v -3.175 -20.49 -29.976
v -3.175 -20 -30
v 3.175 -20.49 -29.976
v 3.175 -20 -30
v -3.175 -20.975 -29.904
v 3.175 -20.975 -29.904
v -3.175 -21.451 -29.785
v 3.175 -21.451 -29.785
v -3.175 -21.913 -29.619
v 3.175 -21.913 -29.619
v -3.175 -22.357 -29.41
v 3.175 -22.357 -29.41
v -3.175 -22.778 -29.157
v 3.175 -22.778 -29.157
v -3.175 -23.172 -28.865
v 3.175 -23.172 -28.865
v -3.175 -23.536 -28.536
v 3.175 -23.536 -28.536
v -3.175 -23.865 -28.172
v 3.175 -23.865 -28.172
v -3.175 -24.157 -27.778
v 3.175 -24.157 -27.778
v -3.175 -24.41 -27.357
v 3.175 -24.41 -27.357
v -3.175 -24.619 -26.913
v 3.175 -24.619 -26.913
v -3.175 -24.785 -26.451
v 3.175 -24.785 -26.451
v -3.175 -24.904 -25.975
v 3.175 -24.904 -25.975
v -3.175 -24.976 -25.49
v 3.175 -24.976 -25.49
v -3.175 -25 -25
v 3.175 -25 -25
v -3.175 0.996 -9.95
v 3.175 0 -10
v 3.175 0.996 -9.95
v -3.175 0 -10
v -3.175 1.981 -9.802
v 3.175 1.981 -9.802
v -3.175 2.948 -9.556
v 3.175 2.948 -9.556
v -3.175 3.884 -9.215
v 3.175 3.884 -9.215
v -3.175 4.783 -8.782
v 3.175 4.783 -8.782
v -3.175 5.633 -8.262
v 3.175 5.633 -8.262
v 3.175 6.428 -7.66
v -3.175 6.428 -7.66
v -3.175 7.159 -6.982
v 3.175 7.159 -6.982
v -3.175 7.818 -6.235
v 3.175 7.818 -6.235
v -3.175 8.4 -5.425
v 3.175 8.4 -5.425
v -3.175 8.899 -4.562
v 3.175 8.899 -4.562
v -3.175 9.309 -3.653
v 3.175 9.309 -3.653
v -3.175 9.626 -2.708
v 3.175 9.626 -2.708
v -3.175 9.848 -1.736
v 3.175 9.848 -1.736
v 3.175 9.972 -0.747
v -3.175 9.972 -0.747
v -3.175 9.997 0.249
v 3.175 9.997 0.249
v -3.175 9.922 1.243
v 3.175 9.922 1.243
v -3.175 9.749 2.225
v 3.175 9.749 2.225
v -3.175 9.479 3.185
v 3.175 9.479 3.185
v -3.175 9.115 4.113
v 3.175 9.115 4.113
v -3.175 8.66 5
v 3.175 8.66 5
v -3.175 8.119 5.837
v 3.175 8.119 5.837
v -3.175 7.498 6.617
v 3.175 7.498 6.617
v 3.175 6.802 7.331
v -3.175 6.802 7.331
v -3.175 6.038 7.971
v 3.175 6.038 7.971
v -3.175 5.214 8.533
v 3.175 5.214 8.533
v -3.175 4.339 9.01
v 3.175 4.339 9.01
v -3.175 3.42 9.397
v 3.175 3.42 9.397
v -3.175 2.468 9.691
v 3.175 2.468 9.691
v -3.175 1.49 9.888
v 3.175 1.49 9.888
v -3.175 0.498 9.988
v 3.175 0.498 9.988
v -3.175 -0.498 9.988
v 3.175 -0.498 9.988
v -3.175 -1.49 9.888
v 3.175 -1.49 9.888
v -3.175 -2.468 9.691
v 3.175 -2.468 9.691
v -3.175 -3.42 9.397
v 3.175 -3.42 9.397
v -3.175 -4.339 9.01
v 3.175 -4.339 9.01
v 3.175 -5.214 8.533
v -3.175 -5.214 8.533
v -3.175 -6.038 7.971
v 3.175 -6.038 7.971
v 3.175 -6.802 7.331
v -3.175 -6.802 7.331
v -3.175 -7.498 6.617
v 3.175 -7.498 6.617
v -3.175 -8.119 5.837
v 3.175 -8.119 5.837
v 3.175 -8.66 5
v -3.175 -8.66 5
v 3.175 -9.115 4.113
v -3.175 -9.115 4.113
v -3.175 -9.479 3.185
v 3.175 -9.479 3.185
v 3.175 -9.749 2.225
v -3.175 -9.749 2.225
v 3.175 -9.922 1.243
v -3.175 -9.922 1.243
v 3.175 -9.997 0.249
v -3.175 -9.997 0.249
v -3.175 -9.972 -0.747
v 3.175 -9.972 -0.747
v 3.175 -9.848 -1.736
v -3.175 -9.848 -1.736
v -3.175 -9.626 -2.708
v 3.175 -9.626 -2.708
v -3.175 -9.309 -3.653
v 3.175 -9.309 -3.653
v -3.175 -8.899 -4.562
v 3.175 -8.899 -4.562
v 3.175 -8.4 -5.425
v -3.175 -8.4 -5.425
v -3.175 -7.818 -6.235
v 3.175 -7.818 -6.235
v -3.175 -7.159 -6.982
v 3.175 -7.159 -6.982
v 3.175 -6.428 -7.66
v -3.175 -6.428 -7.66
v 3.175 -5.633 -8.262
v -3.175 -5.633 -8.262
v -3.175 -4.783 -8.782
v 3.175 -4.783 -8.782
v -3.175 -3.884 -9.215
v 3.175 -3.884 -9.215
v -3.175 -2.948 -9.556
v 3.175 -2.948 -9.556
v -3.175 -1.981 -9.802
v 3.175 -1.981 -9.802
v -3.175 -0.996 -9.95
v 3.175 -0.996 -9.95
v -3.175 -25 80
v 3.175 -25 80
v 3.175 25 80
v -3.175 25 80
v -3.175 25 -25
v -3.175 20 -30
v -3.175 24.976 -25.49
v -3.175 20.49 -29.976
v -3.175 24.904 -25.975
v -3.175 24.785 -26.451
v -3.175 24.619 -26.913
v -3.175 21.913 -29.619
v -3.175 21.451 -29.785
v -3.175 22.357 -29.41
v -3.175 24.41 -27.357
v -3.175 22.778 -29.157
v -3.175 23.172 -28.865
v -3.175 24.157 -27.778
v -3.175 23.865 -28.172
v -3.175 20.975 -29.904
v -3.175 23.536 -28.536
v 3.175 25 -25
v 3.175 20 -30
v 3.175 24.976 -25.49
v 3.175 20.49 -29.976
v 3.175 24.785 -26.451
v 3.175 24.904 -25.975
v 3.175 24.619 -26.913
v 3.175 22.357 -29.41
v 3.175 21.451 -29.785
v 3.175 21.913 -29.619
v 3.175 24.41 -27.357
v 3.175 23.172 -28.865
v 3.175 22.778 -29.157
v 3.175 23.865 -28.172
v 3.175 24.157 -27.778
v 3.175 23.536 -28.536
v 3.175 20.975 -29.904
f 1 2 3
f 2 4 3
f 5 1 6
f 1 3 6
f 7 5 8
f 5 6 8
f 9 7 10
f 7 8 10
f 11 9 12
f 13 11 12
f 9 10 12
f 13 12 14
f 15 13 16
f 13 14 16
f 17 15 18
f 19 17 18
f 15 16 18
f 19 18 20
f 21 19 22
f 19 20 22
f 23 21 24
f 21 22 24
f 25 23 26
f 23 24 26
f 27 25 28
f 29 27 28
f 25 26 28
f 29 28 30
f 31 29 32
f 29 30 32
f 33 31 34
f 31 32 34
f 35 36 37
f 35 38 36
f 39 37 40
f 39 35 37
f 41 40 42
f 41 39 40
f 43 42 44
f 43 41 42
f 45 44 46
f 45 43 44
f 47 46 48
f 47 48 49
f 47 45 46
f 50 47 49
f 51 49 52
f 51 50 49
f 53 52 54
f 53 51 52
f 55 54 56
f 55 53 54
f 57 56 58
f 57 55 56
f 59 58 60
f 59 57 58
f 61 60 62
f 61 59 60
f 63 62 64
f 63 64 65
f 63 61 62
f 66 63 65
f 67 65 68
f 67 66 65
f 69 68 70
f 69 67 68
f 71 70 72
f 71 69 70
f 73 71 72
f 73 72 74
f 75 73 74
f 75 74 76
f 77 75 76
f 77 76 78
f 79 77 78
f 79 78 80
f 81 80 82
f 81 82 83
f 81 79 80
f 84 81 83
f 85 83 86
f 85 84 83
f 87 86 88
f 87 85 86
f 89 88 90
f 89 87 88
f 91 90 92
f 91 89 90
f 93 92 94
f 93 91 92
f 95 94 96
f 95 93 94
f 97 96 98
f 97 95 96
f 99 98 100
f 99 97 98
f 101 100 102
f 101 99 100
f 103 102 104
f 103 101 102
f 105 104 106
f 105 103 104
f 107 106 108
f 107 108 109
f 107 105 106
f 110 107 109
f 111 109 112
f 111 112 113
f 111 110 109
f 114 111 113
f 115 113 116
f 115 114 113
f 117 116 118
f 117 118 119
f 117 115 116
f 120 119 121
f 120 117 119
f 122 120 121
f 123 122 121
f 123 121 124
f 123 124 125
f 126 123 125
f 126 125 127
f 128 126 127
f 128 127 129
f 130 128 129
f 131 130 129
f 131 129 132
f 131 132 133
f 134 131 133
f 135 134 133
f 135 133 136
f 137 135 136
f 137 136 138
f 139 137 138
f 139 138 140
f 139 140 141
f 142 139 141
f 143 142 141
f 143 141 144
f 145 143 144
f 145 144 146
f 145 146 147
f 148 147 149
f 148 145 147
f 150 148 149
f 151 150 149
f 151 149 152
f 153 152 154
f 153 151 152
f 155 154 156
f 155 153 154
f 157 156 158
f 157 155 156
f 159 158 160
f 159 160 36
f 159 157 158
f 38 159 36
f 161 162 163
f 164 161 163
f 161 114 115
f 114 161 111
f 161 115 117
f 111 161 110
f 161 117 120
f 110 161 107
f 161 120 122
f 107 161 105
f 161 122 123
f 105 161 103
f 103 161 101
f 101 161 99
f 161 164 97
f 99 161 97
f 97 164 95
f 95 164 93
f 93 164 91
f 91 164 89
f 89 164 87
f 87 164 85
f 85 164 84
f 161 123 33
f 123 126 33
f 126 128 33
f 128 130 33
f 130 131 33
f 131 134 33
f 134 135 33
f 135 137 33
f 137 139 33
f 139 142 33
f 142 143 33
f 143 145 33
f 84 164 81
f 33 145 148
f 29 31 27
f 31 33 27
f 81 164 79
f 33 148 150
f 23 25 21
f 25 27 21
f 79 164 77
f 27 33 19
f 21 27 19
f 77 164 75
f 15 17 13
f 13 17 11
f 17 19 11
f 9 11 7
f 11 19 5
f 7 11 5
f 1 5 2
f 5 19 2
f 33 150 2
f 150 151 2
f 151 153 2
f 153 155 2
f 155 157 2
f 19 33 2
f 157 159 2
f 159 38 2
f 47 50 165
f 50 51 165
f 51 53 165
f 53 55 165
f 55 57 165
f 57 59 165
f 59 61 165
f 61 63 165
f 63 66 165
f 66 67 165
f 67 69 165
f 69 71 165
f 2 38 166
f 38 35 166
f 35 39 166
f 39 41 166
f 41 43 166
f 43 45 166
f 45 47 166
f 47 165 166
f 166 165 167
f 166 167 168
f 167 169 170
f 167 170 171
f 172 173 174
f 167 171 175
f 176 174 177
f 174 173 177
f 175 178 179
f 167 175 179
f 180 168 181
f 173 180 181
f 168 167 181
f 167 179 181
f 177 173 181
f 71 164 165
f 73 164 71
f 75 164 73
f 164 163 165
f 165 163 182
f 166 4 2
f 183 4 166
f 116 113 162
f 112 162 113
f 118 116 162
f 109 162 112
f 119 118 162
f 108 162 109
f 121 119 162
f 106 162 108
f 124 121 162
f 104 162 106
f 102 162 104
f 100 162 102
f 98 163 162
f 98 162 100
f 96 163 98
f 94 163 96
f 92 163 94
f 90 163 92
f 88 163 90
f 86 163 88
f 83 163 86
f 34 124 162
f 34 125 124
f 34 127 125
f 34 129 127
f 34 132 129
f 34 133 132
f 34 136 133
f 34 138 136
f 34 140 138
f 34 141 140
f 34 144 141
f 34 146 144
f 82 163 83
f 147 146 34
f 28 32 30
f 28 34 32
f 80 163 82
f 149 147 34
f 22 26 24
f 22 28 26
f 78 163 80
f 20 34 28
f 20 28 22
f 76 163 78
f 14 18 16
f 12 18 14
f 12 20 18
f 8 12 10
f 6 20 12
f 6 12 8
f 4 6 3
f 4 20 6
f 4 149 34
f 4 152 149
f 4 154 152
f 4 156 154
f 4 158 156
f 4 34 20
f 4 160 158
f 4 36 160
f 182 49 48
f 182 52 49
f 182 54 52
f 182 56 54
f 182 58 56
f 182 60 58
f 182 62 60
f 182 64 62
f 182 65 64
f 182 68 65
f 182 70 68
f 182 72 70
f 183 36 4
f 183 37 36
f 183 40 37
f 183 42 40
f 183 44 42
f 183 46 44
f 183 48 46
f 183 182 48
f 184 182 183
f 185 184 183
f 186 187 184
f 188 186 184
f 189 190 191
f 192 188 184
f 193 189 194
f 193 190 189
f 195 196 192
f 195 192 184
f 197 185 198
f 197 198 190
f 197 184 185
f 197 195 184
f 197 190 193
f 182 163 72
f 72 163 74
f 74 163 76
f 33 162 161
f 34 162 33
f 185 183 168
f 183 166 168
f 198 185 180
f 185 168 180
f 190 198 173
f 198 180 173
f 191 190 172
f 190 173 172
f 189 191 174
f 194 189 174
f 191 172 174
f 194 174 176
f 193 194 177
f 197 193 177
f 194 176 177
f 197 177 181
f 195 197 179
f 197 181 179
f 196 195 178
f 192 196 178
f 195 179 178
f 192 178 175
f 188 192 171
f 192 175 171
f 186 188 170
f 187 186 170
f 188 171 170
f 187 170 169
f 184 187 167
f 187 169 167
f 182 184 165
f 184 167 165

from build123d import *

# Parameters (mm, degrees)
SKETCH1_W           = 110
SKETCH1_H           = 50
SKETCH1_R           = 10
BOSS_EXTRUDE1_DEPTH = 3.175
FILLET1_R           = 5


with BuildPart() as part:
    # Sketch1 → Boss-Extrude1 (new, symmetric)
    with BuildSketch(Plane(origin=(0, 0, 0), x_dir=(0, 0, -1), z_dir=(1, 0, 0))):
        with Locations((-25, 0)):
            Rectangle(SKETCH1_W, SKETCH1_H)
        Circle(SKETCH1_R, mode=Mode.SUBTRACT)
    extrude(amount=BOSS_EXTRUDE1_DEPTH, both=True)

    # Fillet1
    fillet1_edges = [part.edges().sort_by_distance(p)[0] for p in [
        (0, -25, -30),
        (0, 25, -30),
    ]]
    fillet(fillet1_edges, radius=FILLET1_R)


solid = part.part
